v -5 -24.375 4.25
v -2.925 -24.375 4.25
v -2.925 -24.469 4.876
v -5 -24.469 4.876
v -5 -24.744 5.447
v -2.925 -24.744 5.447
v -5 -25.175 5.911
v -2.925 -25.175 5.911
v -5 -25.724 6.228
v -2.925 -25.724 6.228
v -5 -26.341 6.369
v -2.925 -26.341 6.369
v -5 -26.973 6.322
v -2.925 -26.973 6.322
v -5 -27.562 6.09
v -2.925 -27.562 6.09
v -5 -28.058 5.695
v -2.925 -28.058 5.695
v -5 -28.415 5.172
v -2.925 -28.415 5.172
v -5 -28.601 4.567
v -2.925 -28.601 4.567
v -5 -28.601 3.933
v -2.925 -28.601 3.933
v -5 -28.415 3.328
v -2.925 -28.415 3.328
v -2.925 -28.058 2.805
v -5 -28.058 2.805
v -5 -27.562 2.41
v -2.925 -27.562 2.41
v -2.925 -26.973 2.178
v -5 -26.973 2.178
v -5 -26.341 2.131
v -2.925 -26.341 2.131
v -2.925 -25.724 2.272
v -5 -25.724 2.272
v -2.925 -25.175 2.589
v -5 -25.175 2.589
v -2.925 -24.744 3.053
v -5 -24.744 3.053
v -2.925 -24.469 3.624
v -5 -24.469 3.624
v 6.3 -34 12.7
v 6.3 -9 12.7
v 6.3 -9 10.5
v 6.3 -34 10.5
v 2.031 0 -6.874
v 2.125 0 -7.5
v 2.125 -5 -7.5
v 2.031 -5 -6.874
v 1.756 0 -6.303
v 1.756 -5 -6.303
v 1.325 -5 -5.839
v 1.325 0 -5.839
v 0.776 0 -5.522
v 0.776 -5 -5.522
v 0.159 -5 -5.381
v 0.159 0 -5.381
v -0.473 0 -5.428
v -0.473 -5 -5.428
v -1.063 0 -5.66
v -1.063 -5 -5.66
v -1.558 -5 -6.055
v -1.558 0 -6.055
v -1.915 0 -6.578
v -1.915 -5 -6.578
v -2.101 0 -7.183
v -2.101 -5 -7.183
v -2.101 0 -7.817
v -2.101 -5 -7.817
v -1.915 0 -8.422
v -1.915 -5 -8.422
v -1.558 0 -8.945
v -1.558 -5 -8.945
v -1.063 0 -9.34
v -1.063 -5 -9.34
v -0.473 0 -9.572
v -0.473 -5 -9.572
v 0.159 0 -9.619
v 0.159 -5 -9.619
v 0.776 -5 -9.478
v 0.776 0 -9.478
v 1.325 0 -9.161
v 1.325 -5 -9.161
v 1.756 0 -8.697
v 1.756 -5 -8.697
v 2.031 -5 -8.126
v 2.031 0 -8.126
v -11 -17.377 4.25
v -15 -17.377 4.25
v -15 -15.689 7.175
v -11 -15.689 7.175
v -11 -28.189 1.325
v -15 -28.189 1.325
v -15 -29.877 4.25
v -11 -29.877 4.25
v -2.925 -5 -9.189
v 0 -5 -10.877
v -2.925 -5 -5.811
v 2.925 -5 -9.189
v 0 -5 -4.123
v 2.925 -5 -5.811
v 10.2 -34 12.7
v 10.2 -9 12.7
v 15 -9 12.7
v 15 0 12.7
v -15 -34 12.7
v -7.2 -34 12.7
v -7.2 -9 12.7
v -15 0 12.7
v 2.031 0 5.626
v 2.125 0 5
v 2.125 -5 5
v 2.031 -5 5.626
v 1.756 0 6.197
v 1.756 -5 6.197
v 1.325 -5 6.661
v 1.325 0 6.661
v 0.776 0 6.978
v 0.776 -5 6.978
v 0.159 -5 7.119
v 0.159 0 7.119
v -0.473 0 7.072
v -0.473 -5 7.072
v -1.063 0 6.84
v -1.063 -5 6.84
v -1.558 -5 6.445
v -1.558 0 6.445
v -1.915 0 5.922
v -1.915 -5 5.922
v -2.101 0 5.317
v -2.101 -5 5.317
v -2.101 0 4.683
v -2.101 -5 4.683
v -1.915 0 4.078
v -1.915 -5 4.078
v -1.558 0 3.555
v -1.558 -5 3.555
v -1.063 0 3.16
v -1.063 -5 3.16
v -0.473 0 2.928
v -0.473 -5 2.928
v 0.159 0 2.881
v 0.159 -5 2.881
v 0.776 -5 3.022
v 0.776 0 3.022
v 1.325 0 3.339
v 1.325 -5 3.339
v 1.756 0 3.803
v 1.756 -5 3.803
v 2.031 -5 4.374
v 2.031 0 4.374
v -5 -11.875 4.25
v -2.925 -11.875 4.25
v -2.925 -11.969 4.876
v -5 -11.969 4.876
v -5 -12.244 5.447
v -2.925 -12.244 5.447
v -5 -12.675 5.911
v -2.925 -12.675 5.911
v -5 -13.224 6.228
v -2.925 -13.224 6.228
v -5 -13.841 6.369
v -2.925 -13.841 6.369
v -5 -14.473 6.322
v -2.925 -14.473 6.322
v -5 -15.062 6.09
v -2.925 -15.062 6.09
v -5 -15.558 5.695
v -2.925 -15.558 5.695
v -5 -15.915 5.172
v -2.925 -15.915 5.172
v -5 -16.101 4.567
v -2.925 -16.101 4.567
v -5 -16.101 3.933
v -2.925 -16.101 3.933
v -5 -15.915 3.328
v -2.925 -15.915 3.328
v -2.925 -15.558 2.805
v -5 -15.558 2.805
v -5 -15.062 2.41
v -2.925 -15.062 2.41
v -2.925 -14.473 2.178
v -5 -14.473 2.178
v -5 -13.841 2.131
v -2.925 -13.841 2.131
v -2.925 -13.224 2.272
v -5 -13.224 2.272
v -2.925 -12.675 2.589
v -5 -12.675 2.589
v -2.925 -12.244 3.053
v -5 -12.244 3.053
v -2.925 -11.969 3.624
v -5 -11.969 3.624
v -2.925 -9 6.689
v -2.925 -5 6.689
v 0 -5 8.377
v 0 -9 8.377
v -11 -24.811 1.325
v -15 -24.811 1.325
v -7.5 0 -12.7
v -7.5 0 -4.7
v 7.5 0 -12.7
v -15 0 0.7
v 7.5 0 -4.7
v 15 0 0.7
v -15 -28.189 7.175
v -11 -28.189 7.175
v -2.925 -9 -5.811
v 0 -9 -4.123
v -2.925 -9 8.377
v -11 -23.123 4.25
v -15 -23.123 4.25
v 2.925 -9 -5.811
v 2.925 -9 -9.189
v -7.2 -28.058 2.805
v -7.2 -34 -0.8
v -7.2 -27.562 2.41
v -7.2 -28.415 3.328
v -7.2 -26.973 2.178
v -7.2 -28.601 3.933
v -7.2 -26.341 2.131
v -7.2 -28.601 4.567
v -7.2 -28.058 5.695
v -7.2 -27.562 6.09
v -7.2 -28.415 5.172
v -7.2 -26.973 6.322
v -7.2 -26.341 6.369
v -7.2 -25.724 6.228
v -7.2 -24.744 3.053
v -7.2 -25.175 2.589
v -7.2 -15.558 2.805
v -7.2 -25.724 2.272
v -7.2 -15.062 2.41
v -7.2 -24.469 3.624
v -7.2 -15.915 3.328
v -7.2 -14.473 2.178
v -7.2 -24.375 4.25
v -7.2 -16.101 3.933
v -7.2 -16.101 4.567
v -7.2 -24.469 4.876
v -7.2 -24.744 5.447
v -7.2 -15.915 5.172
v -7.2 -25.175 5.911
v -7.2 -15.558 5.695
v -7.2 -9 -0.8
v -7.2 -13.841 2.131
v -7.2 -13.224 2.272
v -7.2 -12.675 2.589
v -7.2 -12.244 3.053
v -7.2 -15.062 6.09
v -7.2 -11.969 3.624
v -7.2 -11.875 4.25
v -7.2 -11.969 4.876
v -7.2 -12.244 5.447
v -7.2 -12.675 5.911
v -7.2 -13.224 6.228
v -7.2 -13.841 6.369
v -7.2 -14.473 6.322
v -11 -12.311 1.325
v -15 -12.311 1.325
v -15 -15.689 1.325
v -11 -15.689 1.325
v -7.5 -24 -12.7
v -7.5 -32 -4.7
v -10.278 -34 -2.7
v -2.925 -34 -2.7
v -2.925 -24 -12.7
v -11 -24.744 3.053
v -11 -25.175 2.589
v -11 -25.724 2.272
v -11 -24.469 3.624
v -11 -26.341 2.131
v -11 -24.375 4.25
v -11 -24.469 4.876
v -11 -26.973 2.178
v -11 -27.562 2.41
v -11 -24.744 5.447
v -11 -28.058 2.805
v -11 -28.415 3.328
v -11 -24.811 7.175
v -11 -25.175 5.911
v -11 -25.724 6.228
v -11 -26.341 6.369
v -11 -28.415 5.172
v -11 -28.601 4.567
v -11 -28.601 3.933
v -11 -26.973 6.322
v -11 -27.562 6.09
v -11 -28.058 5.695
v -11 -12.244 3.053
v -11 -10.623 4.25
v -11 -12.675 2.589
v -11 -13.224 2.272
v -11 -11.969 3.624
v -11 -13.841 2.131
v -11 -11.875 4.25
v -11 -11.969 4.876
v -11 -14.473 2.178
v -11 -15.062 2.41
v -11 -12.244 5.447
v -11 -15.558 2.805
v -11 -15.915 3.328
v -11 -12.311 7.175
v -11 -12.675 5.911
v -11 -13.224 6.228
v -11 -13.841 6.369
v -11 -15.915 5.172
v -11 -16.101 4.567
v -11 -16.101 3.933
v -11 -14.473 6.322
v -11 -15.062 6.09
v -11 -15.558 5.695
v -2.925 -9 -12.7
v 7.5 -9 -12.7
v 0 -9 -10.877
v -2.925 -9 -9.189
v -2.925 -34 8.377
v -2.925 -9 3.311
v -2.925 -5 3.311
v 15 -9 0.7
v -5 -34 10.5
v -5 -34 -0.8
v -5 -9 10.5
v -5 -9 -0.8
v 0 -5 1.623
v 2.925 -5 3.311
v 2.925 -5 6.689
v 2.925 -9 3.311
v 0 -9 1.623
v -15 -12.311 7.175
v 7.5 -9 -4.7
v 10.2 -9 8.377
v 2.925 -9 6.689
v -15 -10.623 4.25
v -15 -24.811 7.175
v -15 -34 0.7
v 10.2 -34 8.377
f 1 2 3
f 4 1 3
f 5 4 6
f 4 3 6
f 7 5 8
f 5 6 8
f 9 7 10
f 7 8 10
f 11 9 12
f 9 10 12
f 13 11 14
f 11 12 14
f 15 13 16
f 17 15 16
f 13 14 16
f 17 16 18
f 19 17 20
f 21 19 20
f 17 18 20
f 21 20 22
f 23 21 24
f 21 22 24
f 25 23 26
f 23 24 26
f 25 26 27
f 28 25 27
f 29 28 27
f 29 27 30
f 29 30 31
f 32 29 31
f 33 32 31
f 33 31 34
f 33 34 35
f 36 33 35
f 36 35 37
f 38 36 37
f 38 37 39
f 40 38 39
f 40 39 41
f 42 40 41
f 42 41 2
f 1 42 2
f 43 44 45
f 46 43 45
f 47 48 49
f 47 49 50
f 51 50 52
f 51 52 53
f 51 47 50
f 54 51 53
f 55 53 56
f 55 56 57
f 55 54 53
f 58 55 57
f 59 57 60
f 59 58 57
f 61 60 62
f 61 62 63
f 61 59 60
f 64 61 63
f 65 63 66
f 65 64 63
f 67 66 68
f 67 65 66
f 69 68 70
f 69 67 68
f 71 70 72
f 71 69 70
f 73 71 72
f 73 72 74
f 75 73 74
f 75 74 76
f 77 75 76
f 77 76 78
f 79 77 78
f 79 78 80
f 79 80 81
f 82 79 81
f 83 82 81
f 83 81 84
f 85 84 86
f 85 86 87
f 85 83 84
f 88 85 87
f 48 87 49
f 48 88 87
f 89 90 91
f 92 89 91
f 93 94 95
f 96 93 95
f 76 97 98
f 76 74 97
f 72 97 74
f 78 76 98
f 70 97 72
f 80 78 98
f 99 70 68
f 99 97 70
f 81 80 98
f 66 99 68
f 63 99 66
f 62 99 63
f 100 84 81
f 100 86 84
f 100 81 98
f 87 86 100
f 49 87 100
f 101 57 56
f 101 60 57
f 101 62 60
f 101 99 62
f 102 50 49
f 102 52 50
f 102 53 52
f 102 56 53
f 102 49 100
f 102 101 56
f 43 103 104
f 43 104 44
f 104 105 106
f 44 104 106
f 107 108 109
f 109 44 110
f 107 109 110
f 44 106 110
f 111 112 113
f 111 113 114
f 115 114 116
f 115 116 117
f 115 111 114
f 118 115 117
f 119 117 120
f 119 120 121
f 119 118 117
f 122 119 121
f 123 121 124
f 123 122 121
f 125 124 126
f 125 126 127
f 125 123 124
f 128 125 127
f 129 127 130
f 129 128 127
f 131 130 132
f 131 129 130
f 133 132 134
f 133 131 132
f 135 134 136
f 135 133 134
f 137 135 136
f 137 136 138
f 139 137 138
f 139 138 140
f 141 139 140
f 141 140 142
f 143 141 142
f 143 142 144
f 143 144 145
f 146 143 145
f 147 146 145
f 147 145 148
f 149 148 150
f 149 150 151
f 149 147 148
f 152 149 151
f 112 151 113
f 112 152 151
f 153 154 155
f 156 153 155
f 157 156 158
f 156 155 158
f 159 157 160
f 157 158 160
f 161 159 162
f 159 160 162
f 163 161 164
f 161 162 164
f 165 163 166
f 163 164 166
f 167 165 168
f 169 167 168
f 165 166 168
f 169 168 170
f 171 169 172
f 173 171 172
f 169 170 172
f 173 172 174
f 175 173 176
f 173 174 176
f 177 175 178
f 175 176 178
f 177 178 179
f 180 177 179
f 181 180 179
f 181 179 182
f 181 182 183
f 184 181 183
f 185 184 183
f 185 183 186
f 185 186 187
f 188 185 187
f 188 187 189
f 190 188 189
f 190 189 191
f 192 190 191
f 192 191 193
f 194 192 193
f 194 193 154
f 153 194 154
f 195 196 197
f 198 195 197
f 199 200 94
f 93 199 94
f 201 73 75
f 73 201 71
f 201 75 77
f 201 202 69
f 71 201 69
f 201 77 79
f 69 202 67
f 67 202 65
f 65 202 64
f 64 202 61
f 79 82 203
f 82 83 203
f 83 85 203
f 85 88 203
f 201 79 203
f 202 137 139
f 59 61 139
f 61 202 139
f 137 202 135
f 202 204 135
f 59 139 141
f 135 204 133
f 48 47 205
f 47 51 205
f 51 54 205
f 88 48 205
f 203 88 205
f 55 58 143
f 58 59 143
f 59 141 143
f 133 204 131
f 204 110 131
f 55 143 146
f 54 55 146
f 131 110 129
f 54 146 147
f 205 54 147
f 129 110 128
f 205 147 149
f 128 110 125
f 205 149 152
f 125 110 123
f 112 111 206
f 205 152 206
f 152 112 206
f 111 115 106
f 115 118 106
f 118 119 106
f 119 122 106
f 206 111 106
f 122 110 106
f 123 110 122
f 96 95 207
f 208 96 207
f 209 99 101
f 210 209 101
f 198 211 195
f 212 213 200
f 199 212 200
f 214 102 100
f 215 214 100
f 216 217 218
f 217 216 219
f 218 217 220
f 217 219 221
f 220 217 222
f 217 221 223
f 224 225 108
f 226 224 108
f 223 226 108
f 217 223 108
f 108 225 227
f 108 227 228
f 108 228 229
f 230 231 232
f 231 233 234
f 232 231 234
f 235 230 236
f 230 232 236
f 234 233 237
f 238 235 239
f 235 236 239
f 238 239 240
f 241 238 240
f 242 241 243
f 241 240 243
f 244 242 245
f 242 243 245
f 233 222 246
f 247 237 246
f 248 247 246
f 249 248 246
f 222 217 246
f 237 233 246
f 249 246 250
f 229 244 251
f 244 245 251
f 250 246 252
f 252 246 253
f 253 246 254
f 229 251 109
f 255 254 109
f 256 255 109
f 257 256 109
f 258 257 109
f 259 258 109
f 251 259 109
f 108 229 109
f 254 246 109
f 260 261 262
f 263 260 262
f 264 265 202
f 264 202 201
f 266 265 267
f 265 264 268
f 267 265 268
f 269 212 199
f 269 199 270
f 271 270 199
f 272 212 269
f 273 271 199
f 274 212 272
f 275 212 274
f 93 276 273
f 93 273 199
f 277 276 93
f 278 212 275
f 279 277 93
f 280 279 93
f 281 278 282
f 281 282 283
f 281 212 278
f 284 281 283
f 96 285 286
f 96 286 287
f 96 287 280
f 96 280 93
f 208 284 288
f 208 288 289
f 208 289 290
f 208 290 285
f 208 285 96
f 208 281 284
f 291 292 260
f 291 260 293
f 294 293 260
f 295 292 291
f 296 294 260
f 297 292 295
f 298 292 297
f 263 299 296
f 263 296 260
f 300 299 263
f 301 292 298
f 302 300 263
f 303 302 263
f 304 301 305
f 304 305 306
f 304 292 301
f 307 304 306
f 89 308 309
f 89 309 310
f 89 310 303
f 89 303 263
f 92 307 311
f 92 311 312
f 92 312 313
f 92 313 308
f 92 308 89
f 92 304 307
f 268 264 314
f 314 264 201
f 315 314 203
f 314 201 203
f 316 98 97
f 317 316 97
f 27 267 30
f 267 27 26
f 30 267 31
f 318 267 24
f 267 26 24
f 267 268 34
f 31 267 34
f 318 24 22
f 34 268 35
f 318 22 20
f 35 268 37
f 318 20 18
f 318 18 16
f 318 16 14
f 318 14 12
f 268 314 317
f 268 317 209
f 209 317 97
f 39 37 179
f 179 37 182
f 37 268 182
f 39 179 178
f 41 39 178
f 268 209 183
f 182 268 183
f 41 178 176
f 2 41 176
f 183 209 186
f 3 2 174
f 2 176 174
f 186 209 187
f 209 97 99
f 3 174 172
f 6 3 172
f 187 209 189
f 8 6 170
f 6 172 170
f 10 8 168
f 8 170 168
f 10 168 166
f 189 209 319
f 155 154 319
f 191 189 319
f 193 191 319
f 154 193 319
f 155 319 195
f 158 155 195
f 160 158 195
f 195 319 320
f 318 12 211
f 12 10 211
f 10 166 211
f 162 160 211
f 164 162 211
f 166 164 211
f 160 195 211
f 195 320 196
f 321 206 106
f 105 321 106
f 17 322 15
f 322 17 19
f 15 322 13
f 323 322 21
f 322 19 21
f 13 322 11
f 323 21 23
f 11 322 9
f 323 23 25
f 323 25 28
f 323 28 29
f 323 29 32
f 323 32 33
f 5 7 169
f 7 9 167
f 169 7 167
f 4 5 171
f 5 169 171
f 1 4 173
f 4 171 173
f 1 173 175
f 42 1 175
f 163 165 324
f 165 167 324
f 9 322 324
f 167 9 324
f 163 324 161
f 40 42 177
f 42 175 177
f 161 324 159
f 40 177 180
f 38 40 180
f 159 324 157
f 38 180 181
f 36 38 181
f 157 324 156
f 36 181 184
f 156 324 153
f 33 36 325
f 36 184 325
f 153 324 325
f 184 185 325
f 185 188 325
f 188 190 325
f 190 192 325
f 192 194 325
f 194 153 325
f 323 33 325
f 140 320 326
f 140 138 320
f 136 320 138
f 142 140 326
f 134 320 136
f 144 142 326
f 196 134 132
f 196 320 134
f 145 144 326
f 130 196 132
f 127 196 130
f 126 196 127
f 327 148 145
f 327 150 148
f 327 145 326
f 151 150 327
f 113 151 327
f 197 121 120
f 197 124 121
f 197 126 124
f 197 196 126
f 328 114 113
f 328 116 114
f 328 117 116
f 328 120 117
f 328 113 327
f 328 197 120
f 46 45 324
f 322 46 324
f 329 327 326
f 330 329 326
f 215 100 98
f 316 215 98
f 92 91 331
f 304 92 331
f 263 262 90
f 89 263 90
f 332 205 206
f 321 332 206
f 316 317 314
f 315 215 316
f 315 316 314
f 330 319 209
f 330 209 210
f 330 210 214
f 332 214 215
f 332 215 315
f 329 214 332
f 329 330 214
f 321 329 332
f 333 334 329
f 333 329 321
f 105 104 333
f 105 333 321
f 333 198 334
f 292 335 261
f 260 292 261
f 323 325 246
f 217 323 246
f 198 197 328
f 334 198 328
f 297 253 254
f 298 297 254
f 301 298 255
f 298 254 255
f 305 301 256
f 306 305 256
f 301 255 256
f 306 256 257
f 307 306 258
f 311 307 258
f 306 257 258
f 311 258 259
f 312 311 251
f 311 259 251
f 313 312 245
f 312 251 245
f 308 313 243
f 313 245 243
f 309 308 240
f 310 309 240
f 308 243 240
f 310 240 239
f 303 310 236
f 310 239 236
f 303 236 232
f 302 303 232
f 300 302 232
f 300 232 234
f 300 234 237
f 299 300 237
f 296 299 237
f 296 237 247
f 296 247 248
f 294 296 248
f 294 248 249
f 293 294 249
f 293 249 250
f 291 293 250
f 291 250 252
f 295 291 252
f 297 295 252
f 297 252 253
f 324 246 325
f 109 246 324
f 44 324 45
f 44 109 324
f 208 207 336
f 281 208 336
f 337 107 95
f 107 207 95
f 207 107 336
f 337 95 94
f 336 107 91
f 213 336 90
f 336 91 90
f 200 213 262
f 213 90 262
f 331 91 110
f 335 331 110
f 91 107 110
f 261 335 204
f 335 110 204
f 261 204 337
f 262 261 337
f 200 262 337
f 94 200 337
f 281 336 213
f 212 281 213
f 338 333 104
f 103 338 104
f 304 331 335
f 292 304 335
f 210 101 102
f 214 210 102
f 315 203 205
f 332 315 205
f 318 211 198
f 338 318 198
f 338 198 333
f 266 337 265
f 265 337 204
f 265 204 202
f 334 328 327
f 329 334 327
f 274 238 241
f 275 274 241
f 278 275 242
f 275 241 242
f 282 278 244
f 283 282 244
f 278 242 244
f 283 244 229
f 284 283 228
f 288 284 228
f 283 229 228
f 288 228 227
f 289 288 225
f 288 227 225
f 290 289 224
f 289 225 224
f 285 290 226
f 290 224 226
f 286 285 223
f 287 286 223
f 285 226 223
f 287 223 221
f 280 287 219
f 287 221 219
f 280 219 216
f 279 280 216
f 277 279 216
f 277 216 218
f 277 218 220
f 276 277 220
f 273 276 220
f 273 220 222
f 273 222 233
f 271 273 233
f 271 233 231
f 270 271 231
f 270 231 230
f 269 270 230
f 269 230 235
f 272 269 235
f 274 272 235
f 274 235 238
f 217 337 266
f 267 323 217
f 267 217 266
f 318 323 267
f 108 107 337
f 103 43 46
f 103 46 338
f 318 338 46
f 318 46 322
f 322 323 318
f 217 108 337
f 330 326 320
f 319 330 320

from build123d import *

# Parameters (mm, degrees)
F0_R     = 2.125
F1_DEPTH = 5
F3_DEPTH = 4
F5_DEPTH = 25
F6_R     = 2.125
F7_DEPTH = 25
F9_DEPTH = 4
F10_SIZE = 10


with BuildPart() as f1:
    # F0 (on Front) → F1 (new body)
    with BuildSketch(Plane.XZ):
        Polygon((-7.5, -12.7), (7.5, -12.7), (7.5, -4.7), (15, 0.7), (15, 12.7), (-15, 12.7), (-15, 0.7), (-7.5, -4.7), align=None)
        with Locations((0, -7.5)):
            Circle(F0_R, mode=Mode.SUBTRACT)
        with Locations((0, 5)):
            Circle(F0_R, mode=Mode.SUBTRACT)
    extrude(amount=F1_DEPTH)

    # F2 (on face) → F3 (join)
    with BuildSketch(Plane.XZ.offset(5)):
        Polygon((15, 12.7), (-15, 12.7), (-15, 0.7), (-7.5, -4.7), (-7.5, -12.7), (7.5, -12.7), (7.5, -4.7), (15, 0.7), align=None)
        Polygon((0, -4.122501), (2.925, -5.81125), (2.925, -9.18875), (0, -10.877499), (-2.925, -9.18875), (-2.925, -5.81125), align=None, mode=Mode.SUBTRACT)
        Polygon((0, 8.377499), (2.925, 6.68875), (2.925, 3.31125), (0, 1.622501), (-2.925, 3.31125), (-2.925, 6.68875), align=None, mode=Mode.SUBTRACT)
    extrude(amount=F3_DEPTH)

    # F4 (on face) → F5 (join)
    with BuildSketch(Plane.XZ.offset(9)):
        Polygon((-7.2, -0.8), (-7.2, 12.7), (-15, 12.7), (-15, 0.7), (-7.5, -4.7), (-7.5, -12.7), (-2.925, -12.7), (-2.925, 3.31125), (-2.925, 6.68875), (-2.925, 8.377499), (10.2, 8.377499), (10.2, 12.7), (6.3, 12.7), (6.3, 10.5), (-5, 10.5), (-5, -0.8), align=None)
    extrude(amount=F5_DEPTH)

    # F6 (on face) → F7 (cut)
    with BuildSketch(Plane.YZ.offset(-2.925)):
        with Locations((-26.5, 4.25)):
            Circle(F6_R)
        with Locations((-14, 4.25)):
            Circle(F6_R)
    extrude(amount=-F7_DEPTH, mode=Mode.SUBTRACT)

    # F8 (on face) → F9 (cut)
    with BuildSketch(Plane(origin=(-15, 0, 0), x_dir=(0, -1, 0), z_dir=(-1, 0, 0))):
        Polygon((15.68875, 7.175), (12.31125, 7.175), (10.622501, 4.25), (12.31125, 1.325), (15.68875, 1.325), (17.377499, 4.25), align=None)
        Polygon((28.18875, 7.175), (24.81125, 7.175), (23.122501, 4.25), (24.81125, 1.325), (28.18875, 1.325), (29.877499, 4.25), align=None)
    extrude(amount=-F9_DEPTH, mode=Mode.SUBTRACT)

    # F10
    f10_edges = [f1.edges().sort_by_distance(p)[0] for p in [
        (-5.2125, -34, -12.7),
    ]]
    chamfer(f10_edges, length=F10_SIZE)


solid = f1.part
